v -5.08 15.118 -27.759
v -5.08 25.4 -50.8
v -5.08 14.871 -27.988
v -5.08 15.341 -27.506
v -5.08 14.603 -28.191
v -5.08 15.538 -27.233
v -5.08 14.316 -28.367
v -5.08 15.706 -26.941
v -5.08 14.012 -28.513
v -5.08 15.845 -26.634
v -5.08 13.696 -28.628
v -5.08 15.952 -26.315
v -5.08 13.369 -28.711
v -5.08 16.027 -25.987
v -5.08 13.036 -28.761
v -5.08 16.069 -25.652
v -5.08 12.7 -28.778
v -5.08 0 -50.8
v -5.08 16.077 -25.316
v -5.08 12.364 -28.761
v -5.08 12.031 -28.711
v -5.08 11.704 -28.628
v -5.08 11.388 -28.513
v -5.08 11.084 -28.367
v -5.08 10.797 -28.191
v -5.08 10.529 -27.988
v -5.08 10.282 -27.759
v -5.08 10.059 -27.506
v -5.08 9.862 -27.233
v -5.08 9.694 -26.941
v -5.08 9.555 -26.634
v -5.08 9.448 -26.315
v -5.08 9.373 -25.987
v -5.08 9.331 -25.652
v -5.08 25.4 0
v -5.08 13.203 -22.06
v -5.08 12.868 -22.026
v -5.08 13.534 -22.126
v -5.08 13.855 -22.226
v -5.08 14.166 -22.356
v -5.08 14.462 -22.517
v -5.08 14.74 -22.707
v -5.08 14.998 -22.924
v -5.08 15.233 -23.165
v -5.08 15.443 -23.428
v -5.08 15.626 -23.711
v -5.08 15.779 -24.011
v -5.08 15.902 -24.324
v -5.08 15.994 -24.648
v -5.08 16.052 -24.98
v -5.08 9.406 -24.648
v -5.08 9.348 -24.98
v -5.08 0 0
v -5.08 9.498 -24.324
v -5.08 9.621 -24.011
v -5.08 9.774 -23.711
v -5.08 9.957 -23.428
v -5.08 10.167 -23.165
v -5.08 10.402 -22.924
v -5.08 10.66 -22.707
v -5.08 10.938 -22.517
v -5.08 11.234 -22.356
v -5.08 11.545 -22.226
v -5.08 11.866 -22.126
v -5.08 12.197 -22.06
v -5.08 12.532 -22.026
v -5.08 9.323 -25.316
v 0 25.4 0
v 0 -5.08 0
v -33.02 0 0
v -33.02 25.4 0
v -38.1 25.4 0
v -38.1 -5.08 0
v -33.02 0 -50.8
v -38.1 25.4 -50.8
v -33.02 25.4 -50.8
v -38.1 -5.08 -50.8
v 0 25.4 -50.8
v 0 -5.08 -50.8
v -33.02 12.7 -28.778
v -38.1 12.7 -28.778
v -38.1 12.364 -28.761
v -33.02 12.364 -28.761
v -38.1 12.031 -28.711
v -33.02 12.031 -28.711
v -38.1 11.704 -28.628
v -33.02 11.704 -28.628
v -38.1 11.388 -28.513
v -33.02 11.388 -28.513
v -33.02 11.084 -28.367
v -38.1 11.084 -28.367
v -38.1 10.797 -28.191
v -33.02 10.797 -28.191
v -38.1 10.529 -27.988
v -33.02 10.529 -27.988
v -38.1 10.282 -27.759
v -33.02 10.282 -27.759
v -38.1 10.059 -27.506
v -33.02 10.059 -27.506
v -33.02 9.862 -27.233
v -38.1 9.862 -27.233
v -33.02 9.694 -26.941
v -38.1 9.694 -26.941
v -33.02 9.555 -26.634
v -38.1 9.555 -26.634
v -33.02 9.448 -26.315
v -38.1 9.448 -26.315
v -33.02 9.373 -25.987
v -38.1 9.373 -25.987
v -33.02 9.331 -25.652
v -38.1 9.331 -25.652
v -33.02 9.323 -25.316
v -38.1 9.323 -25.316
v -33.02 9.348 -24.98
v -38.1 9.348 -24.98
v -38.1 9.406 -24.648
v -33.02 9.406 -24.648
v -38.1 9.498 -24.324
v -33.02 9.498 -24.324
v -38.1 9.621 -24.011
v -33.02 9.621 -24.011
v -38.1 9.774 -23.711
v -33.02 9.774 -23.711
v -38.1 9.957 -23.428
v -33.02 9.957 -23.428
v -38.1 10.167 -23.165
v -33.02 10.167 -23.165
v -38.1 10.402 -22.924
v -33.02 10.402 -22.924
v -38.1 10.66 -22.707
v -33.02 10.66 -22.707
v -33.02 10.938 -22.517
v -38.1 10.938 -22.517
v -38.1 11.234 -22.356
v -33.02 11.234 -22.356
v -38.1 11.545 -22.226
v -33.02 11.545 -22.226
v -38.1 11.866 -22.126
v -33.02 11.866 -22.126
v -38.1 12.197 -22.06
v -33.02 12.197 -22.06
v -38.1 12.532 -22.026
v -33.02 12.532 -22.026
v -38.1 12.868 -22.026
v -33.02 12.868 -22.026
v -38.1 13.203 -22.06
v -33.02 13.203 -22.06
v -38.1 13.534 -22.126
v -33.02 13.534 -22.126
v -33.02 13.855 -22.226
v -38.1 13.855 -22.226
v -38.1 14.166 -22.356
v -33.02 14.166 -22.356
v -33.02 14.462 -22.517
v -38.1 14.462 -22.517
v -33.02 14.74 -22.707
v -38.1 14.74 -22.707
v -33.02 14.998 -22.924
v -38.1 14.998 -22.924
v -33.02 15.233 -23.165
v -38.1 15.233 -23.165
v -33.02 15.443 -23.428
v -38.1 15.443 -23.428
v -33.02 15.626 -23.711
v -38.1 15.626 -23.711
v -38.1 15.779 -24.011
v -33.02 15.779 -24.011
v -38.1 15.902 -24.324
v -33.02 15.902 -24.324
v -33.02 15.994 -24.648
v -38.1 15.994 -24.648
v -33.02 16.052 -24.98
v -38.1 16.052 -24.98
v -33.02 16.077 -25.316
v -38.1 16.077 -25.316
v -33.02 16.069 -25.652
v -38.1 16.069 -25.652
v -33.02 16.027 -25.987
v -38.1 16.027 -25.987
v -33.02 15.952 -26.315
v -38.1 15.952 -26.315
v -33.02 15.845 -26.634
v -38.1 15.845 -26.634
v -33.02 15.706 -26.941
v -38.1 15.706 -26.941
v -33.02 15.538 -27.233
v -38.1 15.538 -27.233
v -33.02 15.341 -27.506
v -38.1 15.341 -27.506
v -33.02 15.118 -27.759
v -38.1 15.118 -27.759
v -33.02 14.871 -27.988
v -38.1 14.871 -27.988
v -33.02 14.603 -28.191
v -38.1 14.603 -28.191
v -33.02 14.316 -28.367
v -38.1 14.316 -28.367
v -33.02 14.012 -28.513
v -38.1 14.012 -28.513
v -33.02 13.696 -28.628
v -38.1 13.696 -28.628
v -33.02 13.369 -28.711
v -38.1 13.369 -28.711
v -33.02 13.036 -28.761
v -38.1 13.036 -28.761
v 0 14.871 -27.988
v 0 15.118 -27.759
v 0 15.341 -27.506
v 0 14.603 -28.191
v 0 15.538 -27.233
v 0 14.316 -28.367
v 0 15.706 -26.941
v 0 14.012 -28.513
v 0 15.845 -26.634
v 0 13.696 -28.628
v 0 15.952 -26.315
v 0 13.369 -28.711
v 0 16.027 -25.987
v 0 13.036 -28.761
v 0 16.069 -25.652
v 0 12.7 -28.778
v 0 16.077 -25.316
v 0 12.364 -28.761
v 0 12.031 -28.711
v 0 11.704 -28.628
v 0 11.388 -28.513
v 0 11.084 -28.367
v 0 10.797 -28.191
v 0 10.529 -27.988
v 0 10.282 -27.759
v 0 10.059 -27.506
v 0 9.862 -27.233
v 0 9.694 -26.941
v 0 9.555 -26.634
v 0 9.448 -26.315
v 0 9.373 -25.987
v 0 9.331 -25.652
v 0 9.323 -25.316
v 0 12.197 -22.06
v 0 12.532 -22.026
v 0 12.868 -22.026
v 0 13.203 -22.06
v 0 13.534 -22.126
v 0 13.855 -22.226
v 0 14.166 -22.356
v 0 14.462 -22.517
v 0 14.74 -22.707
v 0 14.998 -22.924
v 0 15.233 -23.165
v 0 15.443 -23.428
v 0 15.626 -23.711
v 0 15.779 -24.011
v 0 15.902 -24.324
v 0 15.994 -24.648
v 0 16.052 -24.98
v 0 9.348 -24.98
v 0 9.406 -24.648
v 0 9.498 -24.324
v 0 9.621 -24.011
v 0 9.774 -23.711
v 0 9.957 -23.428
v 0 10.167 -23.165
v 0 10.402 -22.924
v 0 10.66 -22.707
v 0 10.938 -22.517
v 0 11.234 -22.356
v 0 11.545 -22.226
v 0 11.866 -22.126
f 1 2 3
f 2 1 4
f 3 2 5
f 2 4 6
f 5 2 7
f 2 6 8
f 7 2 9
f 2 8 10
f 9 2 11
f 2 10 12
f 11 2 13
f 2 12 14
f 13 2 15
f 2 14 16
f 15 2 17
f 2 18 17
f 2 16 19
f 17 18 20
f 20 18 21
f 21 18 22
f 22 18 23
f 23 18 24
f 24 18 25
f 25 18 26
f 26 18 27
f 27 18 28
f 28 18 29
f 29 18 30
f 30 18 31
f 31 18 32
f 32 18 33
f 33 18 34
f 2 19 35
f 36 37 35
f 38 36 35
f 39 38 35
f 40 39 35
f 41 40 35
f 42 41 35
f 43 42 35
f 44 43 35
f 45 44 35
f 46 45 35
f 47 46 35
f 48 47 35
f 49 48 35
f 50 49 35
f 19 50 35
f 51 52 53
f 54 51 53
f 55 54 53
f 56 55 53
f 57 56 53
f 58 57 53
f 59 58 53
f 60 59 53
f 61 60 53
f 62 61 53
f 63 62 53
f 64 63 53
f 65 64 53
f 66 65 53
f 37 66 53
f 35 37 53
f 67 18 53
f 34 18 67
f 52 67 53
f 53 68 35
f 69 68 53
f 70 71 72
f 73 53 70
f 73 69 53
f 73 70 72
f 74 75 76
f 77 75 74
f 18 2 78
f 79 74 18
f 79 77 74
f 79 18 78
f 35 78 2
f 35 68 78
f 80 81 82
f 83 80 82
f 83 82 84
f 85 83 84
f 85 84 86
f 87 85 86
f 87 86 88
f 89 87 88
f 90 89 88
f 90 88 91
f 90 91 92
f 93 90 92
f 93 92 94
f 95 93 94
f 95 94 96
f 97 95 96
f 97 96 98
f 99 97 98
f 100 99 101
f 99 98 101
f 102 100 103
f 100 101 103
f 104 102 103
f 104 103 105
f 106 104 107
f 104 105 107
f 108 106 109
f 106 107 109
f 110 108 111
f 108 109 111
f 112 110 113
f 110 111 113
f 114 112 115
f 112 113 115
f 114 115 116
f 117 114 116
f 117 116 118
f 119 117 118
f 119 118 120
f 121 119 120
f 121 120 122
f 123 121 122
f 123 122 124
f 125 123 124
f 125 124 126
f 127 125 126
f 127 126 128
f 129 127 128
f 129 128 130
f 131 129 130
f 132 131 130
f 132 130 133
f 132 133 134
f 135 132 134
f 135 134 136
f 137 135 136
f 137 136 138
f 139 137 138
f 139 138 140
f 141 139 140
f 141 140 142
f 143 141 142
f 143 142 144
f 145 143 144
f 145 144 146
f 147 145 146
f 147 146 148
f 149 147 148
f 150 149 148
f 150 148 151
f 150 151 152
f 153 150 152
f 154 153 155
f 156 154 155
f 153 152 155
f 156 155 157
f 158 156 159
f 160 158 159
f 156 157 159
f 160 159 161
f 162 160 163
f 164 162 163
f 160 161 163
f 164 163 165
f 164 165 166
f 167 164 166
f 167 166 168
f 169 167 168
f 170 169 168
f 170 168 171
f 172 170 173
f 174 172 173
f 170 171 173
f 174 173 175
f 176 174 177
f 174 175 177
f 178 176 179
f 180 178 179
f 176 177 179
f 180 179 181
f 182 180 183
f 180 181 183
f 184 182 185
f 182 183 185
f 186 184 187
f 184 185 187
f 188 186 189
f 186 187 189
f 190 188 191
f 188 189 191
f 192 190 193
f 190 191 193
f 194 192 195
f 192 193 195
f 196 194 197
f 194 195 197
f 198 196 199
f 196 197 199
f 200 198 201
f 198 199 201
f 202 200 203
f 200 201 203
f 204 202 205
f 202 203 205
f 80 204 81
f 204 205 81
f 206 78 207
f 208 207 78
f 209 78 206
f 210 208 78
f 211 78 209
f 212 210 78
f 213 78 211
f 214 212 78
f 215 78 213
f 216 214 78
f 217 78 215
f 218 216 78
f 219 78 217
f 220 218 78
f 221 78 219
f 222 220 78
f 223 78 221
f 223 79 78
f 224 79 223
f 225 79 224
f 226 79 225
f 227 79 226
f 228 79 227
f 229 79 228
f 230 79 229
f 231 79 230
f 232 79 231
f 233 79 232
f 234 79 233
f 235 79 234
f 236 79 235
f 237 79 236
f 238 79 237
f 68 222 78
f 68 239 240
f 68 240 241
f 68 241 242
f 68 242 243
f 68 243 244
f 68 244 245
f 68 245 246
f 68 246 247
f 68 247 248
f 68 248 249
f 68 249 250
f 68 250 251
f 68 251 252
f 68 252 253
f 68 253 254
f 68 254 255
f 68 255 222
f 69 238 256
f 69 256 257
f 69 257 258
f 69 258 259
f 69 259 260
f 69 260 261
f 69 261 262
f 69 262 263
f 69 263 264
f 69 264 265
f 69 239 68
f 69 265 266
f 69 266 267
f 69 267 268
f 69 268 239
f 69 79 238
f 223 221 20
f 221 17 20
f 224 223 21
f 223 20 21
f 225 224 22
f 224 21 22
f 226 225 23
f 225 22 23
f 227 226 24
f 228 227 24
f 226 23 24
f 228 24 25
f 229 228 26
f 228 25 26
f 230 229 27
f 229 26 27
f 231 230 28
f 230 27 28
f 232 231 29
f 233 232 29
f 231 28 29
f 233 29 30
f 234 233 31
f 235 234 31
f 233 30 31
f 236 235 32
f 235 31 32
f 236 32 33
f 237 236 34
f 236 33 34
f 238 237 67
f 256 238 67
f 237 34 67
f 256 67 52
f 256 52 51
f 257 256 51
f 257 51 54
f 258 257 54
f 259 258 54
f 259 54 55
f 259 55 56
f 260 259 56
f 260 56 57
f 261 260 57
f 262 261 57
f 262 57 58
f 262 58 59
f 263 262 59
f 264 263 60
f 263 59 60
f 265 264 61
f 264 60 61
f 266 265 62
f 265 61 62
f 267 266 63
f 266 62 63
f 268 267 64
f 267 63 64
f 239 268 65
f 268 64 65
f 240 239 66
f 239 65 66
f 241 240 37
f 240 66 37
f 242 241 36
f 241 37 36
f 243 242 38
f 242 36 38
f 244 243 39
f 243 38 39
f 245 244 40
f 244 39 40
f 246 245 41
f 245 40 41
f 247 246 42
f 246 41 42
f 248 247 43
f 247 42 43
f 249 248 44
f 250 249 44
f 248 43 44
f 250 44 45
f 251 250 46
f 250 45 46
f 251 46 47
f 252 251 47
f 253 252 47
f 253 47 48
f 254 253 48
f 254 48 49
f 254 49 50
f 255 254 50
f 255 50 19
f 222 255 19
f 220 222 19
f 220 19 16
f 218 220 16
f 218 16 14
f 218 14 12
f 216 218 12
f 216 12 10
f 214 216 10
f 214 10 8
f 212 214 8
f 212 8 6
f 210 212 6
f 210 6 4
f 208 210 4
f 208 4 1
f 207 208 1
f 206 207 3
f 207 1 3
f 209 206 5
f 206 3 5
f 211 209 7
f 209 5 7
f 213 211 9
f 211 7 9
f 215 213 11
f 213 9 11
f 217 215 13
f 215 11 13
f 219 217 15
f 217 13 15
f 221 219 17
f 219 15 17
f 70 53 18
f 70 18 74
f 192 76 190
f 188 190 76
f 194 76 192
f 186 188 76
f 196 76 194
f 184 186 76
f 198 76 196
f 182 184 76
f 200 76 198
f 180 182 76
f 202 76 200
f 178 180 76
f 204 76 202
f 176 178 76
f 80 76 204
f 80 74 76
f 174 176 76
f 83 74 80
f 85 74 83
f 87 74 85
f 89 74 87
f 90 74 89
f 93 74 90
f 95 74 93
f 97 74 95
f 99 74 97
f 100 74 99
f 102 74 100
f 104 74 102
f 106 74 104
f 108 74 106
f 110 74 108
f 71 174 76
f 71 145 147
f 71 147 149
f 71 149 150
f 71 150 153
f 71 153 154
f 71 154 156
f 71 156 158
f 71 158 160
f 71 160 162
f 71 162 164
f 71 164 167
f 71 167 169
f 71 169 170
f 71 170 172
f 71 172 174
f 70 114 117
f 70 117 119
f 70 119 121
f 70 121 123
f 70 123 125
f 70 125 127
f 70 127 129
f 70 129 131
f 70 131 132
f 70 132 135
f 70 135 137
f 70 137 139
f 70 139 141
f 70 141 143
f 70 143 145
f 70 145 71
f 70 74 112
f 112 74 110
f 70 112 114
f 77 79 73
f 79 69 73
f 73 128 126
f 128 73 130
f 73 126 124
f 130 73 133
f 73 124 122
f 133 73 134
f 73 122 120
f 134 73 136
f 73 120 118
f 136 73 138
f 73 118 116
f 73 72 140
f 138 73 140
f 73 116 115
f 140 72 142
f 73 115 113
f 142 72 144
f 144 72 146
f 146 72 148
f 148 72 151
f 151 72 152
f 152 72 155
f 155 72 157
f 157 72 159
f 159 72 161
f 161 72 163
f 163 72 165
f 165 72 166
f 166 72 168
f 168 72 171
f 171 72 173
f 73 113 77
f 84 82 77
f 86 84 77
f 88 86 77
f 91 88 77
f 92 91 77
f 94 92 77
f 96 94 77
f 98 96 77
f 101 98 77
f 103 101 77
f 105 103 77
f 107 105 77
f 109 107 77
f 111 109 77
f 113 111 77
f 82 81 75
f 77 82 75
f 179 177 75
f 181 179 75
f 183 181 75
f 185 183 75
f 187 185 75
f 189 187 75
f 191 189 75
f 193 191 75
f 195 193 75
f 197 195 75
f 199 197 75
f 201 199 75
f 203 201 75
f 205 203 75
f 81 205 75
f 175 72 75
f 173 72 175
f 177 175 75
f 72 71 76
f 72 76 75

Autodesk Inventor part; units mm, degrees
ref_plane "YZ Plane" through (0, 0, 0) normal (1, 0, 0) x (0, 1, 0)
ref_plane "XZ Plane" through (0, 0, 0) normal (0, 1, 0) x (-1, 0, 0)
ref_plane "XY Plane" through (0, 0, 0) normal (0, 0, 1) x (1, 0, 0)
sketch "Sketch1" plane through (0, 0, 0) normal (0, 1, 0) x (-1, 0, 0)
  line L0 (0, 0) -> (38.1, 0)
  line L1 (38.1, 0) -> (38.1, -50.8)
  line L2 (38.1, -50.8) -> (0, -50.8)
  line L3 (0, -50.8) -> (0, 0)
  line L4 (38.1, -50.8) -> (33.02, -50.8)
  line L5 (33.02, -50.8) -> (33.02, 0)
  line L6 (33.02, 0) -> (38.1, 0)
  line L7 (38.1, 0) -> (38.1, -50.8)
  line L8 (0, -50.8) -> (5.08, -50.8)
  line L9 (5.08, -50.8) -> (5.08, 0)
  line L10 (5.08, 0) -> (0, 0)
  line L11 (0, 0) -> (0, -50.8)
  dimension "d0" = 38.1
  dimension "d1" = 50.8
  dimension "d2" = 5.08
  dimension "d3" = 5.08
extrude "Extrusion1" add sketch "Sketch1" along normal blind 25.4 contours L0 L9 L2 L3 | L0 L1 L2 L5
extrude "Extrusion2" add sketch "Sketch1" against normal blind 5.08
sketch "Sketch2" plane through (0, 25.4, 0) normal (1, 0, 0) x (0, 0, -1)
  line L0 (50.8, 0) -> (0, 0) projected
  line L1 (25.4, 0) -> (25.4, -12.7)
  point P0 (0, -25.4)
  dimension "d8" = 12.7
hole "Hole1" at (0, 12.7, -25.4) direction (-1, 0, 0) diameter 6.7564 end through all clearance for "Socket Head Cap Screw" size "1/4" standard "Ansi Unified Screw Threads"
properties part number "Clip for 1 in 8020"
